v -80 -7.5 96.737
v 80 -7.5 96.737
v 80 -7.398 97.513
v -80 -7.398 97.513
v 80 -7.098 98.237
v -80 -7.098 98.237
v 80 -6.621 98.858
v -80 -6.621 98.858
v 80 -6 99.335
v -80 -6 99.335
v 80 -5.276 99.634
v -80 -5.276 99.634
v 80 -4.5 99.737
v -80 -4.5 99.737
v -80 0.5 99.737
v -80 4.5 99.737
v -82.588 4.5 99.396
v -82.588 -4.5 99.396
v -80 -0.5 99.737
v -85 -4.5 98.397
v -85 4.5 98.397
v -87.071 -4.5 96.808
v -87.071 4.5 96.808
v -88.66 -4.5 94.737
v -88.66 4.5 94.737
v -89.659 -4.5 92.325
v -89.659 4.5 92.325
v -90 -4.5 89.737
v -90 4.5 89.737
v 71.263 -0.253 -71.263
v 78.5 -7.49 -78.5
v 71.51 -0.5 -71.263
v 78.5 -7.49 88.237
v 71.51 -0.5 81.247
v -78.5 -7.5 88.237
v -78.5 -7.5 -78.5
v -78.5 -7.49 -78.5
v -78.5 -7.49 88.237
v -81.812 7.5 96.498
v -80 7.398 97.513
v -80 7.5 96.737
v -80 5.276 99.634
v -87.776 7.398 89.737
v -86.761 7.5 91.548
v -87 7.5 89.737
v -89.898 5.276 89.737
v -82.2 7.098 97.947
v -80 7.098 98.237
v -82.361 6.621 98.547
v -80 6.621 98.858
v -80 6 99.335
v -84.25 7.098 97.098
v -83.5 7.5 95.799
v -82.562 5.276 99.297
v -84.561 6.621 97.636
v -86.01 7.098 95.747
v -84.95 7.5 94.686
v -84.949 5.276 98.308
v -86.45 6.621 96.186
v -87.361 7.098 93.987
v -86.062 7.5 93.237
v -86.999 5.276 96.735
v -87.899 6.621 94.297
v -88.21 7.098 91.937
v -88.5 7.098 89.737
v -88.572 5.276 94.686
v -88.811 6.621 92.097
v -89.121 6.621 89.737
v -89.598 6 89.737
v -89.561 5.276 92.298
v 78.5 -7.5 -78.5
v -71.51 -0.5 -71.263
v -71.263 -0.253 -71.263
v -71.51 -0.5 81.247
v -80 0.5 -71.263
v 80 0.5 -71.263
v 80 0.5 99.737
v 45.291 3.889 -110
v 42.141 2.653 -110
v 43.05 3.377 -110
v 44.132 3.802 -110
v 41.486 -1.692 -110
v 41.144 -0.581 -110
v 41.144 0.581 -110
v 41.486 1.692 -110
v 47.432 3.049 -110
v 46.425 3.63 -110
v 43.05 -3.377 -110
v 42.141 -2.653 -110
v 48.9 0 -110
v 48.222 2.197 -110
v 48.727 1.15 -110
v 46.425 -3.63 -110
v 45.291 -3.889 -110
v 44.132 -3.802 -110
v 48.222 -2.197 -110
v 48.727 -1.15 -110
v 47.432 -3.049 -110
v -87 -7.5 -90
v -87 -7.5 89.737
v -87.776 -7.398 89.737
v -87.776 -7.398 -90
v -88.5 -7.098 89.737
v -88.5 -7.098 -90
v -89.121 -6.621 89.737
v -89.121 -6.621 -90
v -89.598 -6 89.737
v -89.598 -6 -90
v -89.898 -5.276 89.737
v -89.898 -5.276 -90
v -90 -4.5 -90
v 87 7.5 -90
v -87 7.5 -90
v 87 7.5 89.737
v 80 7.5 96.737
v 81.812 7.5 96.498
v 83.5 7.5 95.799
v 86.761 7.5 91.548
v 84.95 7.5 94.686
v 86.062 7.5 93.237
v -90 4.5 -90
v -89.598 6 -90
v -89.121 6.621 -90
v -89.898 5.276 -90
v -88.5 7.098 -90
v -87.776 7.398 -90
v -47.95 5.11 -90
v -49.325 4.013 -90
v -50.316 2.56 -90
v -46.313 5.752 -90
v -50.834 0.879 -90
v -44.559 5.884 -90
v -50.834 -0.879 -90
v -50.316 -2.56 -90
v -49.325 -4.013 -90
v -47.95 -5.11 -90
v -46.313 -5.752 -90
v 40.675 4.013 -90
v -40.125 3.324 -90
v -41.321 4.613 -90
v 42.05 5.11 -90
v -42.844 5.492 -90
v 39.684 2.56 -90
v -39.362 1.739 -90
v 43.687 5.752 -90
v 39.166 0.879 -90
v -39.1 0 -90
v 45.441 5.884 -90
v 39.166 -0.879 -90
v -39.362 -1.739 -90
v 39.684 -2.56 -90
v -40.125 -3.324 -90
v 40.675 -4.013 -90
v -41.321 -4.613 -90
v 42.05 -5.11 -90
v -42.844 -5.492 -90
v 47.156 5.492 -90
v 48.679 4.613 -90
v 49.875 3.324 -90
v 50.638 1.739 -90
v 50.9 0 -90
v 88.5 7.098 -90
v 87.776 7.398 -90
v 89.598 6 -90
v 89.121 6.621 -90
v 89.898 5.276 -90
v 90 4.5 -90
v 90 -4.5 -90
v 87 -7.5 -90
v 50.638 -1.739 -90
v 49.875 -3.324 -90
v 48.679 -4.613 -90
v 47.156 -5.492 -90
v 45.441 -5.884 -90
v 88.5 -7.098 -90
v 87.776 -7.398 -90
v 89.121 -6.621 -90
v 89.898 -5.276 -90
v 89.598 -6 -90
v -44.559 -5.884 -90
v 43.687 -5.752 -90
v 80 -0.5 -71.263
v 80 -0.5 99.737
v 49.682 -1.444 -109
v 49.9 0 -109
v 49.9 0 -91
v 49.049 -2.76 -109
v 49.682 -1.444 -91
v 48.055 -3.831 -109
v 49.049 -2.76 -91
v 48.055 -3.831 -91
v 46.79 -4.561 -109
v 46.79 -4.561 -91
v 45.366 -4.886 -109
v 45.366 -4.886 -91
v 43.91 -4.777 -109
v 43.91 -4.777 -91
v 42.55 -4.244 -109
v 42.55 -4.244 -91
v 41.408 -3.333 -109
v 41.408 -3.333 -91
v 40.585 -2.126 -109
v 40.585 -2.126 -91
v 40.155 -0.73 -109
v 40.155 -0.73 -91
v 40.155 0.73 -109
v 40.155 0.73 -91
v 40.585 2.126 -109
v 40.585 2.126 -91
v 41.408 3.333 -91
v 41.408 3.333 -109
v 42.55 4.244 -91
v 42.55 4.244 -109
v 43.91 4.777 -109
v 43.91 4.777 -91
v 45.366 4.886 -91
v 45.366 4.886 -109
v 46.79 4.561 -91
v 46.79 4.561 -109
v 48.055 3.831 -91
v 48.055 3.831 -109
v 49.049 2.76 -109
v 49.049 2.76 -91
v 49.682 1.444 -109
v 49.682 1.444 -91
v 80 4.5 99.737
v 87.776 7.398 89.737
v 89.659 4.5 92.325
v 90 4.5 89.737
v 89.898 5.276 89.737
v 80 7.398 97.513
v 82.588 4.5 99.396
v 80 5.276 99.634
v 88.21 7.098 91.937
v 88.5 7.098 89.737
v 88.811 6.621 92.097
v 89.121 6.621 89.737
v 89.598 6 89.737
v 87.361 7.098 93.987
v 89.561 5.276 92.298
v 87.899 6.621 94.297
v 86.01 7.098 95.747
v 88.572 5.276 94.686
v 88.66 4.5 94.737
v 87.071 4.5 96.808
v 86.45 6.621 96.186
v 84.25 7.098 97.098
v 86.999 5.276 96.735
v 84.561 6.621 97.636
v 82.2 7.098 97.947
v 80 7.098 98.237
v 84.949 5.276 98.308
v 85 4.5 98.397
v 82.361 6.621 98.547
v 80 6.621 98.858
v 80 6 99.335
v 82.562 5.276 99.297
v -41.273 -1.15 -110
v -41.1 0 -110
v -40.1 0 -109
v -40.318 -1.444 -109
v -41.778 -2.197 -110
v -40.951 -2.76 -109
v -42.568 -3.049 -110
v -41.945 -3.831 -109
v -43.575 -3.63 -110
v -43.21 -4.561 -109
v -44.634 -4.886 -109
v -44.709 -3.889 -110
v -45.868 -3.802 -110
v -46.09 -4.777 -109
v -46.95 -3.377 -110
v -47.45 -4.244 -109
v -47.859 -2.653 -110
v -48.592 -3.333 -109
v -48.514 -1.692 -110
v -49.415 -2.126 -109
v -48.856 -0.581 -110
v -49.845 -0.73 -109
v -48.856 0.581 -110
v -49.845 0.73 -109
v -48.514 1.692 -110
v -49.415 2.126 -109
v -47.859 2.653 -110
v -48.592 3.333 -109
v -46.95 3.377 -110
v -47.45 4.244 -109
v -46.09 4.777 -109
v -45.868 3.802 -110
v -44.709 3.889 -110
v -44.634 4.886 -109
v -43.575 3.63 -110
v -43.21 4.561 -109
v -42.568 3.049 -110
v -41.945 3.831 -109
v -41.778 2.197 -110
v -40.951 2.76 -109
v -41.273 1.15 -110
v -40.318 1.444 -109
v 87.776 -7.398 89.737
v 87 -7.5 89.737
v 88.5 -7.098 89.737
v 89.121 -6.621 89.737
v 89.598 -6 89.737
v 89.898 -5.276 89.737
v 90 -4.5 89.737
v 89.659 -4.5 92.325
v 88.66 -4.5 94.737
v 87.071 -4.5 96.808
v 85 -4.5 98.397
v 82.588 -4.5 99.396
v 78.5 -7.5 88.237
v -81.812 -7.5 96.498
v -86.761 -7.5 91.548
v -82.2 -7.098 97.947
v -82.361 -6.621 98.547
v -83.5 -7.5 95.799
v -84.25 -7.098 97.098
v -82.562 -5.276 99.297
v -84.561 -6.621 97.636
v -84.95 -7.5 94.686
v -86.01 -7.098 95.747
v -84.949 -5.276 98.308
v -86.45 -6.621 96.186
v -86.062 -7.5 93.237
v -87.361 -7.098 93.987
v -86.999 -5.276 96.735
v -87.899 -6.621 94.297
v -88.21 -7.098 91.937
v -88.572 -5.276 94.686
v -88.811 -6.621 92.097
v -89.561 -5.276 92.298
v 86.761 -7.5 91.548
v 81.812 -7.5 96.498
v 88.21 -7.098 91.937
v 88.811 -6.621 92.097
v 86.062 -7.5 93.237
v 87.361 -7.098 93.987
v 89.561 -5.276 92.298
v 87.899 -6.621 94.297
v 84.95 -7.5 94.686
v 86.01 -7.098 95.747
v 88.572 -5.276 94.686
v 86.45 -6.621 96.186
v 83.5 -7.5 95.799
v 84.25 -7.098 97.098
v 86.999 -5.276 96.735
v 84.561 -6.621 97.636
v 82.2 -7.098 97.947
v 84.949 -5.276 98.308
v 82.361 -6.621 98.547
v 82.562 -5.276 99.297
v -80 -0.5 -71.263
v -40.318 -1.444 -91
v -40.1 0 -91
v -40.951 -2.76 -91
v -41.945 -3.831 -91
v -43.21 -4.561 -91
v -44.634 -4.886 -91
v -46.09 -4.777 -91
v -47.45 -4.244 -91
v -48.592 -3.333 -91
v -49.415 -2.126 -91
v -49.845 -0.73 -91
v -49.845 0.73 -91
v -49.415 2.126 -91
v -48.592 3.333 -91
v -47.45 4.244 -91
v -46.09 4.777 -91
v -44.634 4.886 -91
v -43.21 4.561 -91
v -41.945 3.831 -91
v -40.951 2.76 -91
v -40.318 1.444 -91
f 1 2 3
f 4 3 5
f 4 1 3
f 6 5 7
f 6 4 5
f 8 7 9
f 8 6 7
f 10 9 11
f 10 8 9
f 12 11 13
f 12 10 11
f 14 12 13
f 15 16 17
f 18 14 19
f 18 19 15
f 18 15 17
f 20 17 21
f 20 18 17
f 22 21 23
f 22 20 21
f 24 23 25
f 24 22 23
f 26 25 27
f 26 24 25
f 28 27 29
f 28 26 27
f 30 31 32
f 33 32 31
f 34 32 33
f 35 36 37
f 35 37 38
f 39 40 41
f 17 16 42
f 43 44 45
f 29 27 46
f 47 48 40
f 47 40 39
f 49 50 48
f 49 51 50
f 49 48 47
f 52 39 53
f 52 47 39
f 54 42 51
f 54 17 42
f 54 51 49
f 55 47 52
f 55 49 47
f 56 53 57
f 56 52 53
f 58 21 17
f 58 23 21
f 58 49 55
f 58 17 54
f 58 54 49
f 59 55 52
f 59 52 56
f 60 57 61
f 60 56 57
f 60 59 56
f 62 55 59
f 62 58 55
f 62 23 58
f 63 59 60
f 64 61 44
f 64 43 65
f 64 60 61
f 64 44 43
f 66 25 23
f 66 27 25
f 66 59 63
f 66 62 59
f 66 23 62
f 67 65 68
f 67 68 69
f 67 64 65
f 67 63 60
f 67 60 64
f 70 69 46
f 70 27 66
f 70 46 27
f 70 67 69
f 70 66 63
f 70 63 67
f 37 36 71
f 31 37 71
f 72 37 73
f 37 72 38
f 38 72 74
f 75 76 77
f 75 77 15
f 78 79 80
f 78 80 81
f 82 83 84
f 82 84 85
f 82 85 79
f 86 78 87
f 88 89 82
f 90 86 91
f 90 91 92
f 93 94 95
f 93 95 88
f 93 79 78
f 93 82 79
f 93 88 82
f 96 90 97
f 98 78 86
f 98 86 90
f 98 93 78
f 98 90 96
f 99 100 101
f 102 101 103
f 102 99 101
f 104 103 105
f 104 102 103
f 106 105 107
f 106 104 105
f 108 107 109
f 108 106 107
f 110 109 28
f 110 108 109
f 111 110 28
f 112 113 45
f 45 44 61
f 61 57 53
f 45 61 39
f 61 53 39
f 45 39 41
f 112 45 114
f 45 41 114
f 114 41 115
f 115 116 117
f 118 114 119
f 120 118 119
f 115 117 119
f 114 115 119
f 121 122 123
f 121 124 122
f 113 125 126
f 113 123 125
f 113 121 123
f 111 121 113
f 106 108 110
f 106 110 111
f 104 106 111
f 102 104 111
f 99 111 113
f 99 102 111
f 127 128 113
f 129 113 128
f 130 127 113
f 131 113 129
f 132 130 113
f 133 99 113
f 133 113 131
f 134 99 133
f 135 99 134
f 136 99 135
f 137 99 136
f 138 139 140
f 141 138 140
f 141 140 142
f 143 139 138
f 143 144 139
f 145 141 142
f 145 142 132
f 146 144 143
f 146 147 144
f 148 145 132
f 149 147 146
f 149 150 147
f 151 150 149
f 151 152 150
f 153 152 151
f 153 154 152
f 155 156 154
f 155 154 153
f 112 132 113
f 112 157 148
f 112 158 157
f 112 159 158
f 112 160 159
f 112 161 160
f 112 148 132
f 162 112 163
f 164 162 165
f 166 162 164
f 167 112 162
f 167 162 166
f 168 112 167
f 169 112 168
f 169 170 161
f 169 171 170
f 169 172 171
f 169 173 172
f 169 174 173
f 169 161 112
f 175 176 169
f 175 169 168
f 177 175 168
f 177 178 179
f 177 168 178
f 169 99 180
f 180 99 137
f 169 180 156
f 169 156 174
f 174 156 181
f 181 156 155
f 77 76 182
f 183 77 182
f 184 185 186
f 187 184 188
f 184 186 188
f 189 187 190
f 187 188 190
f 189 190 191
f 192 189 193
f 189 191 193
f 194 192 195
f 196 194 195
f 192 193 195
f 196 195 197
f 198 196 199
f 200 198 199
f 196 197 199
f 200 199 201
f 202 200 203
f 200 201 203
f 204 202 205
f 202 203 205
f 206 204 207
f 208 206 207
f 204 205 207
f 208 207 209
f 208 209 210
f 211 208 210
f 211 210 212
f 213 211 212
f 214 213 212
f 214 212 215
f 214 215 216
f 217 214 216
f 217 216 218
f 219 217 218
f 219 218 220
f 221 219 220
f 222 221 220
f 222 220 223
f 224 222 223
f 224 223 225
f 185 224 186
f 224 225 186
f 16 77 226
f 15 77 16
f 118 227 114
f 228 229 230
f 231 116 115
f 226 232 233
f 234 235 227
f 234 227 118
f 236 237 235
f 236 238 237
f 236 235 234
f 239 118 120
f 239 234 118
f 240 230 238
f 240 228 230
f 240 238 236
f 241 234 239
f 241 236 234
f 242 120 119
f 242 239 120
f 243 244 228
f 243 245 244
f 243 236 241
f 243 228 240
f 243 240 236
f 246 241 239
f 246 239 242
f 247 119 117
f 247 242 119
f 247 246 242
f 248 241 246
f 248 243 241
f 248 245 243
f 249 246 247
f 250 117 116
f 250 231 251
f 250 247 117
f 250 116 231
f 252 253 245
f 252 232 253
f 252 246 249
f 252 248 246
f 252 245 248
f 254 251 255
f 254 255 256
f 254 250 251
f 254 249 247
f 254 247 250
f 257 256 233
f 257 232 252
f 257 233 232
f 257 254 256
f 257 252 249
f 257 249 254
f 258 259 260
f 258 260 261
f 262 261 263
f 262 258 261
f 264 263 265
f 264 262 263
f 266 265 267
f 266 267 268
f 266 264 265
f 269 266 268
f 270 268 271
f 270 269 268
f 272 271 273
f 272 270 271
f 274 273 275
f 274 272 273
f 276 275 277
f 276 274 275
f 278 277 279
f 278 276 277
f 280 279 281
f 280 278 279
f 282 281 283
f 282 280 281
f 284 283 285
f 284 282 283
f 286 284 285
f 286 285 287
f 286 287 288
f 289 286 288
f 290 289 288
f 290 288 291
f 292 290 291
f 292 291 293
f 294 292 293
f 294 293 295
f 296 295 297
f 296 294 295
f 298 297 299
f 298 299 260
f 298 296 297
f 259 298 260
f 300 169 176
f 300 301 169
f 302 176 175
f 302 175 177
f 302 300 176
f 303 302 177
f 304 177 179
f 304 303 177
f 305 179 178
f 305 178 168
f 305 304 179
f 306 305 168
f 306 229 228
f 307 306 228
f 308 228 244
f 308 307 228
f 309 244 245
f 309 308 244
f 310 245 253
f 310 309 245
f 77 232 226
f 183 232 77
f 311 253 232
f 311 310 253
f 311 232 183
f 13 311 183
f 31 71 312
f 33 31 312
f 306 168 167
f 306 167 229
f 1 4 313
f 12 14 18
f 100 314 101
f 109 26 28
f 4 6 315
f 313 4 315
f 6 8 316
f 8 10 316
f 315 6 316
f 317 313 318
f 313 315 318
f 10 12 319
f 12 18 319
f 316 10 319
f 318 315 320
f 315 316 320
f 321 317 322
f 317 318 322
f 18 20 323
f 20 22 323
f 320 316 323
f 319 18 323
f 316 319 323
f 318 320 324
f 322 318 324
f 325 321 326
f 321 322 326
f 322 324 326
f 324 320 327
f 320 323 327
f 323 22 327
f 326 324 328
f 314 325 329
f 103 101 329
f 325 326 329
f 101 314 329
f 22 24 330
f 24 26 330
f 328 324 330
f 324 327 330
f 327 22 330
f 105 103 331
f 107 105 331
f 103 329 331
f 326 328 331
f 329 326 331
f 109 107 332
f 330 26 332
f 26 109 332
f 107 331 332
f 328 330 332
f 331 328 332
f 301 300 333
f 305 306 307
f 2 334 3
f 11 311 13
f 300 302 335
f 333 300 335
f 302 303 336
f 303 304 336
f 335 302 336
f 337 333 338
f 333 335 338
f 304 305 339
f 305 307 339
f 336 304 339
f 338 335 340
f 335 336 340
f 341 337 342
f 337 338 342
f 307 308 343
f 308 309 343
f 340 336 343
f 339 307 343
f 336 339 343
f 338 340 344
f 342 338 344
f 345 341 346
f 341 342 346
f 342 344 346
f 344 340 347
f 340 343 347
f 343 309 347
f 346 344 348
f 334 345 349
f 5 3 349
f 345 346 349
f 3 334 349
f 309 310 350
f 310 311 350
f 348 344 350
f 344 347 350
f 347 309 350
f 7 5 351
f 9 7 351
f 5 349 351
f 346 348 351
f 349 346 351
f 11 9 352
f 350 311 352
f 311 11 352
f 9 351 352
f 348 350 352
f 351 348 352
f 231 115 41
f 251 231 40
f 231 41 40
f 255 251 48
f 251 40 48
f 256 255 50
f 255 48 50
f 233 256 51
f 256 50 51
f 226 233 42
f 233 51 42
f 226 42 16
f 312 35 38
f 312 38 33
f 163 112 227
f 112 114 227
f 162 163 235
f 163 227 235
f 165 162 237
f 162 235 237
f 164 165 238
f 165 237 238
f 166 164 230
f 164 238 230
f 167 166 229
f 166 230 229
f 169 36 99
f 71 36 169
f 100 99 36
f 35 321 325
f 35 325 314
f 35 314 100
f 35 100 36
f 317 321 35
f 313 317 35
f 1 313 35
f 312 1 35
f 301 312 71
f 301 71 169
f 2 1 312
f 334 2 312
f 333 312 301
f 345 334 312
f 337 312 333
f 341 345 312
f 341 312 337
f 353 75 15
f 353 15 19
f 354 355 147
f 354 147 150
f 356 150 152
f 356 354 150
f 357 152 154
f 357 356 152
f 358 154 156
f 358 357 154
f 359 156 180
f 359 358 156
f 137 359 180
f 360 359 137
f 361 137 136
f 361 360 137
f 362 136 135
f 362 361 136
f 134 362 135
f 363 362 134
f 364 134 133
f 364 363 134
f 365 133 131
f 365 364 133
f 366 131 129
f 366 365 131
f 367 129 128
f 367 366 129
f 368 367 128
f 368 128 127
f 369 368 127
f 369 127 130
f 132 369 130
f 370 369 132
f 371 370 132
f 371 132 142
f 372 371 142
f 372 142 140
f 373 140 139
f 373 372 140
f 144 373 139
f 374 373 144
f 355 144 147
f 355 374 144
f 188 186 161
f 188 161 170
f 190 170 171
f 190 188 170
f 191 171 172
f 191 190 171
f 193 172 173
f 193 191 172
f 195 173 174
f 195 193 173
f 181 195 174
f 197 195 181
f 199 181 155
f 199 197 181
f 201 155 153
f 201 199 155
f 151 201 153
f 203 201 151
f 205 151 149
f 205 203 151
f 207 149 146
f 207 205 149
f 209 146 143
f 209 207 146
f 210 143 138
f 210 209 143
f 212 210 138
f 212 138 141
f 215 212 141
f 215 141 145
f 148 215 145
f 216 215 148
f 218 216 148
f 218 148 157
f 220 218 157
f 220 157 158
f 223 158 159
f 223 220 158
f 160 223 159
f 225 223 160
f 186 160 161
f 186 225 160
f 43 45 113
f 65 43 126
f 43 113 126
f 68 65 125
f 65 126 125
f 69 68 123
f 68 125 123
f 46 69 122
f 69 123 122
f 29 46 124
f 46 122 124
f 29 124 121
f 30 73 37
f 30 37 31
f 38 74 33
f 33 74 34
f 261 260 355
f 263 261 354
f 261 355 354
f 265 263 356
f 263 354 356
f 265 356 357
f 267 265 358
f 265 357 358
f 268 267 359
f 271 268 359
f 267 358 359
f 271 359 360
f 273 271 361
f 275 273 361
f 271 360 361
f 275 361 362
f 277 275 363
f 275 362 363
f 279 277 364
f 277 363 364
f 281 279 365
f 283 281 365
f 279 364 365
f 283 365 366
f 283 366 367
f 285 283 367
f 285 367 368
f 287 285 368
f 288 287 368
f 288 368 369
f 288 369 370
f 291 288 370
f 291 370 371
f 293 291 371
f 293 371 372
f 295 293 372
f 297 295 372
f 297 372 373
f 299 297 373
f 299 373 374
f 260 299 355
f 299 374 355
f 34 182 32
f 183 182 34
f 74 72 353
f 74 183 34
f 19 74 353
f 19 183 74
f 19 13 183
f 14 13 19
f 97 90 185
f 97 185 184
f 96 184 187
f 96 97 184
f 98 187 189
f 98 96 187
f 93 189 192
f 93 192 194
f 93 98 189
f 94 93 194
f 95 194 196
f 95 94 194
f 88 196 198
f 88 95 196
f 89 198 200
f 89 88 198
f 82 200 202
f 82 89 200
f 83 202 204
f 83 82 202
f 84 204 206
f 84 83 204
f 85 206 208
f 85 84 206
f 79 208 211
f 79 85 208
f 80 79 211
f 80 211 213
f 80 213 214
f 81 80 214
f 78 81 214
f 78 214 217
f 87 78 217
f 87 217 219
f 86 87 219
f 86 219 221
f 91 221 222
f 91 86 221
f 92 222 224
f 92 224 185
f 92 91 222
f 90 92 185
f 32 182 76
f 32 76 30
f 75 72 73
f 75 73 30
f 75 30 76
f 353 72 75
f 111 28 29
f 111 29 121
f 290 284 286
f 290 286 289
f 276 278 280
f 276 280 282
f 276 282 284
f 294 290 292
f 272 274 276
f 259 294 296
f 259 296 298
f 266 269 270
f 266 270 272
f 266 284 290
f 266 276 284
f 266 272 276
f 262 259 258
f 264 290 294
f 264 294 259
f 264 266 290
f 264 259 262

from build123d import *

# Parameters (mm, degrees)
PAD_DEPTH       = 7.5
SKETCH001_W     = 157
SKETCH001_H     = 166.73666
POCKET_DEPTH    = 8
CHAMFER_SIZE    = 7.99
SKETCH002_R     = 4.9
PAD001_DEPTH    = 20
CHAMFER001_SIZE = 1
FILLET_R        = 3
SKETCH003_W     = 160
SKETCH003_H     = 1
POCKET001_DEPTH = 171


with BuildPart() as part:
    # Sketch → Pad (new body, symmetric)
    with BuildSketch(Plane.XZ):
        with BuildLine():
            Line((-90, 89.73666), (-90, -90))
            Line((-90, -90), (90, -90))
            Line((90, -90), (90, 89.73666))
            ThreePointArc((90, 89.73666), (87.071068, 96.807727), (80, 99.73666))
            Line((80, 99.73666), (-80, 99.73666))
            ThreePointArc((-80, 99.73666), (-87.071068, 96.807727), (-90, 89.73666))
        make_face()
    extrude(amount=PAD_DEPTH, both=True)

    # Sketch001 (on Face8 of Pad) → Pocket (cut)
    with BuildSketch(Plane.XZ.offset(7.5)):
        with Locations((0, 4.86833)):
            Rectangle(SKETCH001_W, SKETCH001_H)
    extrude(amount=-POCKET_DEPTH, mode=Mode.SUBTRACT)

    # Chamfer
    chamfer_edges = [part.edges().sort_by_distance(p)[0] for p in [
        (0, 0.5, 88.23666),
        (-78.5, 0.5, 4.86833),
        (0, 0.5, -78.5),
        (78.5, 0.5, 4.86833),
    ]]
    chamfer(chamfer_edges, length=CHAMFER_SIZE)

    # Sketch002 (on Face3 of Pocket) → Pad001 (join)
    with BuildSketch(Plane(origin=(0, 0, -90), x_dir=(1, 0, 0), z_dir=(0, 0, -1))):
        with Locations((-45, 0)):
            Circle(SKETCH002_R)
        with Locations((45, 0)):
            Circle(SKETCH002_R)
    extrude(amount=PAD001_DEPTH)

    # Chamfer001
    chamfer001_edges = [part.edges().sort_by_distance(p)[0] for p in [
        (40.1, 0, -90),
        (-49.9, 0, -90),
        (-49.9, 0, -110),
        (40.1, 0, -110),
    ]]
    chamfer(chamfer001_edges, length=CHAMFER001_SIZE)

    # Fillet
    fillet_edges = [part.edges().sort_by_distance(p)[0] for p in [
        (90, -7.5, -0.13167),
        (90, 7.5, -0.13167),
    ]]
    fillet(fillet_edges, radius=FILLET_R)

    # Sketch003 (on Face26 of Fillet) → Pocket001 (cut)
    with BuildSketch(Plane(origin=(0, 0, 99.73666), x_dir=(-1, 0, 0), z_dir=(0, 0, 1))):
        Rectangle(SKETCH003_W, SKETCH003_H)
    extrude(amount=-POCKET001_DEPTH, mode=Mode.SUBTRACT)


solid = part.part
